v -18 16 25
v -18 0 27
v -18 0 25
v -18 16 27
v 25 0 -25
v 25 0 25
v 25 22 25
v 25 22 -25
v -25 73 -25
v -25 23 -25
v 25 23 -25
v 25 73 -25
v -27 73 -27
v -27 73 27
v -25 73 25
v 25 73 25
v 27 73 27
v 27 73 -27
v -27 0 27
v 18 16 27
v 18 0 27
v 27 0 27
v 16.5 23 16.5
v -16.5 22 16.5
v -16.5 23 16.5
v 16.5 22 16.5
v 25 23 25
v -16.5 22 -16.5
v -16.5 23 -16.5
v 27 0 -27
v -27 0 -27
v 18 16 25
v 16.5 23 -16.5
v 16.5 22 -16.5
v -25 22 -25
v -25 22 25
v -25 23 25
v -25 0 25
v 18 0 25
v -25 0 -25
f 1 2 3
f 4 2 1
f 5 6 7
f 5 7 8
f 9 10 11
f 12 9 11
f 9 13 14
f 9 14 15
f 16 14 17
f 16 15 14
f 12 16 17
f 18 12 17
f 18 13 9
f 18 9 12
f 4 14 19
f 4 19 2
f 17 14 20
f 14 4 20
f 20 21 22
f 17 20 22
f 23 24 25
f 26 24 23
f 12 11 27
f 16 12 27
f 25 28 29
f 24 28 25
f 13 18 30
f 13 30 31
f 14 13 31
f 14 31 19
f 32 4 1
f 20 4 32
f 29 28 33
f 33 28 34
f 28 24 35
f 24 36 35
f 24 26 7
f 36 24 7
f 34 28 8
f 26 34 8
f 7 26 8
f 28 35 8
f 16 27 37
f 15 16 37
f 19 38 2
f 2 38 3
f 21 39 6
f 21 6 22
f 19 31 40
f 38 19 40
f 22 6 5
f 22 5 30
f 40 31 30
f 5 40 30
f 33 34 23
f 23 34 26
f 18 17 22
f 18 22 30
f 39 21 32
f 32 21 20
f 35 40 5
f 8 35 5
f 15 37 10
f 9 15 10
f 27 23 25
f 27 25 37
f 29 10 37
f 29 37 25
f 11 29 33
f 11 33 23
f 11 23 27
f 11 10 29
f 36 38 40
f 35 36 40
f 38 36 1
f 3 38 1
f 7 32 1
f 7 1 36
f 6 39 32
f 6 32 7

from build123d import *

# Parameters (mm, degrees)
SKETCH1_W           = 54
SKETCH1_H           = 54
SKETCH1_W_2         = 50
SKETCH1_H_2         = 50
BOSS_EXTRUDE1_DEPTH = 22
SKETCH2_W           = 54
SKETCH2_H           = 54
BOSS_EXTRUDE2_DEPTH = 1
SKETCH3_R           = 6
CUT_EXTRUDE1_DEPTH  = 24
SKETCH4_W           = 2
SKETCH4_H           = 50
SKETCH4_H_2         = 2
SKETCH4_W_2         = 50
BOSS_EXTRUDE3_DEPTH = 50
SKETCH5_W           = 33
SKETCH5_H           = 33
CUT_EXTRUDE2_DEPTH  = 52
CUT_EXTRUDE3_REACH  = 56
SKETCH6_W           = 36
SKETCH6_H           = 16


with BuildPart() as part:
    # Sketch1 → Boss-Extrude1 (new body)
    with BuildSketch(Plane(origin=(0, 0, 0), x_dir=(1, 0, 0), z_dir=(0, 1, 0))):
        Rectangle(SKETCH1_W, SKETCH1_H)
        Rectangle(SKETCH1_W_2, SKETCH1_H_2, mode=Mode.SUBTRACT)
    extrude(amount=BOSS_EXTRUDE1_DEPTH)

    # Sketch2 → Boss-Extrude2 (add)
    with BuildSketch(Plane(origin=(0, 22, 0), x_dir=(1, 0, 0), z_dir=(0, 1, 0))):
        Rectangle(SKETCH2_W, SKETCH2_H)
    extrude(amount=BOSS_EXTRUDE2_DEPTH)

    # Sketch3 → Cut-Extrude1 (cut, through all)
    with BuildSketch(Plane(origin=(0, 23, 0), x_dir=(1, 0, 0), z_dir=(0, 1, 0))):
        Circle(SKETCH3_R)
    extrude(amount=-CUT_EXTRUDE1_DEPTH, mode=Mode.SUBTRACT)

    # Sketch4 → Boss-Extrude3 (add)
    with BuildSketch(Plane(origin=(0, 23, 0), x_dir=(1, 0, 0), z_dir=(0, 1, 0))):
        with Locations((-26, 0)):
            Rectangle(SKETCH4_W, SKETCH4_H)
        with Locations((-26, -26)):
            Rectangle(SKETCH4_W, SKETCH4_H_2)
        with Locations((0, -26)):
            Rectangle(SKETCH4_W_2, SKETCH4_H_2)
        with Locations((26, -26)):
            Rectangle(SKETCH4_W, SKETCH4_H_2)
        with Locations((26, 0)):
            Rectangle(SKETCH4_W, SKETCH4_H)
        with Locations((26, 26)):
            Rectangle(SKETCH4_W, SKETCH4_H_2)
        with Locations((0, 26)):
            Rectangle(SKETCH4_W_2, SKETCH4_H_2)
        with Locations((-26, 26)):
            Rectangle(SKETCH4_W, SKETCH4_H_2)
    extrude(amount=BOSS_EXTRUDE3_DEPTH)

    # Sketch5 → Cut-Extrude2 (cut, through all)
    with BuildSketch(Plane.XZ.offset(-22)):
        Rectangle(SKETCH5_W, SKETCH5_H)
    extrude(amount=-CUT_EXTRUDE2_DEPTH, mode=Mode.SUBTRACT)

    # Sketch6 → Cut-Extrude3 (cut, up to next)
    with BuildSketch(Plane.XY.offset(27), mode=Mode.PRIVATE) as cut_extrude3_sk1:
        with Locations((0, 8)):
            Rectangle(SKETCH6_W, SKETCH6_H)
    cut_extrude3_tool1 = extrude(cut_extrude3_sk1.sketch, amount=-CUT_EXTRUDE3_REACH, mode=Mode.PRIVATE) & part.part
    add(cut_extrude3_tool1.solids().sort_by_distance((0, 8, 27))[0], mode=Mode.SUBTRACT)


solid = part.part
